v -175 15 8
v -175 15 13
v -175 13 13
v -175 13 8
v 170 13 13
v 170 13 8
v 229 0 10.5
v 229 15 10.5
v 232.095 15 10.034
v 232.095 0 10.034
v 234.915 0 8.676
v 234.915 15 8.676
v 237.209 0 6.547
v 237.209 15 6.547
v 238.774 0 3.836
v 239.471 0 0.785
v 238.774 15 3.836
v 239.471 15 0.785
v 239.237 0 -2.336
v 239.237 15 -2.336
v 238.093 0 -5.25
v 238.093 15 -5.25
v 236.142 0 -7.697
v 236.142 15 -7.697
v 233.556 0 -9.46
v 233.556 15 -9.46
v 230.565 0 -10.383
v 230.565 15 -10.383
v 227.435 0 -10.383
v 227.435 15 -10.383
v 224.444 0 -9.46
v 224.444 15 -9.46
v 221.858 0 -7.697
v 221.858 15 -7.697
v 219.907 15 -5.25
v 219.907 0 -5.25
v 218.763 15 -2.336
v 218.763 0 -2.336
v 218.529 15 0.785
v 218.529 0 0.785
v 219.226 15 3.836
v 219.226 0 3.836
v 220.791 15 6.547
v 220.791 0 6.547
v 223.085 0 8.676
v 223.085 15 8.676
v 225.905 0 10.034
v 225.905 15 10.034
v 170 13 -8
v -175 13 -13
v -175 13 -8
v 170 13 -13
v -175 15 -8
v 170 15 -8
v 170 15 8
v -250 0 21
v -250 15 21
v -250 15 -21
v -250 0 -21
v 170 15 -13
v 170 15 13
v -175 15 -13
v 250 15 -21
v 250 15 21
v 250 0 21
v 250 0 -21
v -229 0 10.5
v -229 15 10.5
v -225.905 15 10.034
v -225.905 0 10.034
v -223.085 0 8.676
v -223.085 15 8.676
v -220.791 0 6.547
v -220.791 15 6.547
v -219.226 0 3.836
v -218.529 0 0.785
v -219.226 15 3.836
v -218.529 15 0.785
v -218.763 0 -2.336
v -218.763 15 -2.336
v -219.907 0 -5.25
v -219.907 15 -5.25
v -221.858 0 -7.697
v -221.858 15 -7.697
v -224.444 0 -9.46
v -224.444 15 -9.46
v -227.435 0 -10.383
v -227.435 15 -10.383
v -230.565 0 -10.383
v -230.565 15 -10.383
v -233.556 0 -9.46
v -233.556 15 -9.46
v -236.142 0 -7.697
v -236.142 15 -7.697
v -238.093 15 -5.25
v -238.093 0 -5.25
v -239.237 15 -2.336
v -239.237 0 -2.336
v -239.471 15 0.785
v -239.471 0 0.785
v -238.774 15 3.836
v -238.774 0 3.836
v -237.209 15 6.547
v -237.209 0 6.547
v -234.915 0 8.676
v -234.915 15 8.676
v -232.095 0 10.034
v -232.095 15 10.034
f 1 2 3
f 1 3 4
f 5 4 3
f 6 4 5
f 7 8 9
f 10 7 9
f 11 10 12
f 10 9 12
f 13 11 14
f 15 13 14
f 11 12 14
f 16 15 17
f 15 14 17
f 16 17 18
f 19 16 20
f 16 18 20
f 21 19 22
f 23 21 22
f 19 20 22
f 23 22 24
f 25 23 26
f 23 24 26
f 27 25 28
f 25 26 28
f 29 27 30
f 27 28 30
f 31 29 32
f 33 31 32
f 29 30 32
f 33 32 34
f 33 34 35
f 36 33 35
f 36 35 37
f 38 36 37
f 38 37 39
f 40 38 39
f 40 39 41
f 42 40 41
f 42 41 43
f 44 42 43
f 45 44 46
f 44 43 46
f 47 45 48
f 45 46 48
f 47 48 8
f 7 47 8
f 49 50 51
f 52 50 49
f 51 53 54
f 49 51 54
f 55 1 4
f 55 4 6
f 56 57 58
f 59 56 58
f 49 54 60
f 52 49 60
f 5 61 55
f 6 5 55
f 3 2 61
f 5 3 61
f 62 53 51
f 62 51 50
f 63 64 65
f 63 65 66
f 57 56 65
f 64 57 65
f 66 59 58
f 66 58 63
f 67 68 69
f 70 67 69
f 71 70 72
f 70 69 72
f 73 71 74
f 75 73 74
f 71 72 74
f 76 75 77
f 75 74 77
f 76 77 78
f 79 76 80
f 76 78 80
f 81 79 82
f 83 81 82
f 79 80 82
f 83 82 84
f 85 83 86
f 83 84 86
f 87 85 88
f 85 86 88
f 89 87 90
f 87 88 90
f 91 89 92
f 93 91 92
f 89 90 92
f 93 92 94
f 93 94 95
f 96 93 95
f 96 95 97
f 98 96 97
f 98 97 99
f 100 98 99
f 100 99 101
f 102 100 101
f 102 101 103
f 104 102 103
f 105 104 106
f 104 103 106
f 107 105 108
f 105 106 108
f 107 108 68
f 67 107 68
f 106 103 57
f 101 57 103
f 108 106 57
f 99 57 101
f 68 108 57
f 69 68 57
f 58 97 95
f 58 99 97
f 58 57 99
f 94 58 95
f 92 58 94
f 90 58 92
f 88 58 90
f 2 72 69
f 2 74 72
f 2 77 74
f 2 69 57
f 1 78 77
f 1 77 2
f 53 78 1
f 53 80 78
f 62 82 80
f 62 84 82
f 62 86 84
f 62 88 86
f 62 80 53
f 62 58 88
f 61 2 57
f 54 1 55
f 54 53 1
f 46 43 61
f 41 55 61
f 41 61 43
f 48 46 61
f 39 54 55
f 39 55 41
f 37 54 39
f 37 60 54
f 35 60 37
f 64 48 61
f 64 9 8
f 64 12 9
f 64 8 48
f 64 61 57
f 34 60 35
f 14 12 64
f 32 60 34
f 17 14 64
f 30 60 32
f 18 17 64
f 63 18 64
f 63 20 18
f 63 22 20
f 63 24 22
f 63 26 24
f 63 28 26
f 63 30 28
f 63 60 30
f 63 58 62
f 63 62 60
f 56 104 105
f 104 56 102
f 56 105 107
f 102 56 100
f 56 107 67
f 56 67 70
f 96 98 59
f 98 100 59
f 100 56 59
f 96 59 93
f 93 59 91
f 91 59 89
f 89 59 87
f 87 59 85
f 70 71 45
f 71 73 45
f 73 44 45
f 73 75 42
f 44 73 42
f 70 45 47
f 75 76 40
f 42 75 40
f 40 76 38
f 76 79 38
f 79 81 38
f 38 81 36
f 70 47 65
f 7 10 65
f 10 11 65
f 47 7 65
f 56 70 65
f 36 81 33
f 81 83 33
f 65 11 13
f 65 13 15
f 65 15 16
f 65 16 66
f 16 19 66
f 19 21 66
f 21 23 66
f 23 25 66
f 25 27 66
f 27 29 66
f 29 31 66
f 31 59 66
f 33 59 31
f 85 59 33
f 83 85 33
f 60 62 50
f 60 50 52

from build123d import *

# Parameters (mm, degrees)
ESQUISSE1_W             = 520
ESQUISSE1_H             = 42
BOSS_EXTRU_1_DEPTH      = 15
ESQUISSE2_R             = 10.5
ENL_V_MAT_EXTRU_1_DEPTH = 15
ESQUISSE3_W             = 10
ESQUISSE3_H             = 42
ENL_V_MAT_EXTRU_2_DEPTH = 262.277630118
ESQUISSE4_W             = 345
ESQUISSE4_H             = 5
ENL_V_MAT_EXTRU_3_DEPTH = 2


with BuildPart() as part:
    # Esquisse1 → Boss.-Extru.1 (new body)
    with BuildSketch(Plane(origin=(0, 0, 0), x_dir=(1, 0, 0), z_dir=(0, 1, 0))):
        Rectangle(ESQUISSE1_W, ESQUISSE1_H)
    extrude(amount=BOSS_EXTRU_1_DEPTH)

    # Esquisse2 → Enlèv. mat.-Extru.1 (cut)
    with BuildSketch(Plane(origin=(0, 15, 0), x_dir=(1, 0, 0), z_dir=(0, 1, 0))):
        with Locations(Location((-229, 0, 0), (0, 0, 270))):
            Circle(ESQUISSE2_R)
        with Locations(Location((229, 0, 0), (0, 0, 270))):
            Circle(ESQUISSE2_R)
    extrude(amount=-ENL_V_MAT_EXTRU_1_DEPTH, mode=Mode.SUBTRACT)

    # Esquisse3 → Enlèv. mat.-Extru.2 (cut, through all)
    with BuildSketch(Plane(origin=(0, 15, 0), x_dir=(1, 0, 0), z_dir=(0, 1, 0))):
        with Locations((-255, 0)):
            Rectangle(ESQUISSE3_W, ESQUISSE3_H)
        with Locations((255, 0)):
            Rectangle(ESQUISSE3_W, ESQUISSE3_H)
    extrude(amount=-ENL_V_MAT_EXTRU_2_DEPTH, mode=Mode.SUBTRACT)

    # Esquisse4 → Enlèv. mat.-Extru.3 (cut)
    with BuildSketch(Plane(origin=(0, 15, 0), x_dir=(1, 0, 0), z_dir=(0, 1, 0))):
        with Locations((-2.5, -10.5)):
            Rectangle(ESQUISSE4_W, ESQUISSE4_H)
        with Locations((-2.5, 10.5)):
            Rectangle(ESQUISSE4_W, ESQUISSE4_H)
    extrude(amount=-ENL_V_MAT_EXTRU_3_DEPTH, mode=Mode.SUBTRACT)


solid = part.part
